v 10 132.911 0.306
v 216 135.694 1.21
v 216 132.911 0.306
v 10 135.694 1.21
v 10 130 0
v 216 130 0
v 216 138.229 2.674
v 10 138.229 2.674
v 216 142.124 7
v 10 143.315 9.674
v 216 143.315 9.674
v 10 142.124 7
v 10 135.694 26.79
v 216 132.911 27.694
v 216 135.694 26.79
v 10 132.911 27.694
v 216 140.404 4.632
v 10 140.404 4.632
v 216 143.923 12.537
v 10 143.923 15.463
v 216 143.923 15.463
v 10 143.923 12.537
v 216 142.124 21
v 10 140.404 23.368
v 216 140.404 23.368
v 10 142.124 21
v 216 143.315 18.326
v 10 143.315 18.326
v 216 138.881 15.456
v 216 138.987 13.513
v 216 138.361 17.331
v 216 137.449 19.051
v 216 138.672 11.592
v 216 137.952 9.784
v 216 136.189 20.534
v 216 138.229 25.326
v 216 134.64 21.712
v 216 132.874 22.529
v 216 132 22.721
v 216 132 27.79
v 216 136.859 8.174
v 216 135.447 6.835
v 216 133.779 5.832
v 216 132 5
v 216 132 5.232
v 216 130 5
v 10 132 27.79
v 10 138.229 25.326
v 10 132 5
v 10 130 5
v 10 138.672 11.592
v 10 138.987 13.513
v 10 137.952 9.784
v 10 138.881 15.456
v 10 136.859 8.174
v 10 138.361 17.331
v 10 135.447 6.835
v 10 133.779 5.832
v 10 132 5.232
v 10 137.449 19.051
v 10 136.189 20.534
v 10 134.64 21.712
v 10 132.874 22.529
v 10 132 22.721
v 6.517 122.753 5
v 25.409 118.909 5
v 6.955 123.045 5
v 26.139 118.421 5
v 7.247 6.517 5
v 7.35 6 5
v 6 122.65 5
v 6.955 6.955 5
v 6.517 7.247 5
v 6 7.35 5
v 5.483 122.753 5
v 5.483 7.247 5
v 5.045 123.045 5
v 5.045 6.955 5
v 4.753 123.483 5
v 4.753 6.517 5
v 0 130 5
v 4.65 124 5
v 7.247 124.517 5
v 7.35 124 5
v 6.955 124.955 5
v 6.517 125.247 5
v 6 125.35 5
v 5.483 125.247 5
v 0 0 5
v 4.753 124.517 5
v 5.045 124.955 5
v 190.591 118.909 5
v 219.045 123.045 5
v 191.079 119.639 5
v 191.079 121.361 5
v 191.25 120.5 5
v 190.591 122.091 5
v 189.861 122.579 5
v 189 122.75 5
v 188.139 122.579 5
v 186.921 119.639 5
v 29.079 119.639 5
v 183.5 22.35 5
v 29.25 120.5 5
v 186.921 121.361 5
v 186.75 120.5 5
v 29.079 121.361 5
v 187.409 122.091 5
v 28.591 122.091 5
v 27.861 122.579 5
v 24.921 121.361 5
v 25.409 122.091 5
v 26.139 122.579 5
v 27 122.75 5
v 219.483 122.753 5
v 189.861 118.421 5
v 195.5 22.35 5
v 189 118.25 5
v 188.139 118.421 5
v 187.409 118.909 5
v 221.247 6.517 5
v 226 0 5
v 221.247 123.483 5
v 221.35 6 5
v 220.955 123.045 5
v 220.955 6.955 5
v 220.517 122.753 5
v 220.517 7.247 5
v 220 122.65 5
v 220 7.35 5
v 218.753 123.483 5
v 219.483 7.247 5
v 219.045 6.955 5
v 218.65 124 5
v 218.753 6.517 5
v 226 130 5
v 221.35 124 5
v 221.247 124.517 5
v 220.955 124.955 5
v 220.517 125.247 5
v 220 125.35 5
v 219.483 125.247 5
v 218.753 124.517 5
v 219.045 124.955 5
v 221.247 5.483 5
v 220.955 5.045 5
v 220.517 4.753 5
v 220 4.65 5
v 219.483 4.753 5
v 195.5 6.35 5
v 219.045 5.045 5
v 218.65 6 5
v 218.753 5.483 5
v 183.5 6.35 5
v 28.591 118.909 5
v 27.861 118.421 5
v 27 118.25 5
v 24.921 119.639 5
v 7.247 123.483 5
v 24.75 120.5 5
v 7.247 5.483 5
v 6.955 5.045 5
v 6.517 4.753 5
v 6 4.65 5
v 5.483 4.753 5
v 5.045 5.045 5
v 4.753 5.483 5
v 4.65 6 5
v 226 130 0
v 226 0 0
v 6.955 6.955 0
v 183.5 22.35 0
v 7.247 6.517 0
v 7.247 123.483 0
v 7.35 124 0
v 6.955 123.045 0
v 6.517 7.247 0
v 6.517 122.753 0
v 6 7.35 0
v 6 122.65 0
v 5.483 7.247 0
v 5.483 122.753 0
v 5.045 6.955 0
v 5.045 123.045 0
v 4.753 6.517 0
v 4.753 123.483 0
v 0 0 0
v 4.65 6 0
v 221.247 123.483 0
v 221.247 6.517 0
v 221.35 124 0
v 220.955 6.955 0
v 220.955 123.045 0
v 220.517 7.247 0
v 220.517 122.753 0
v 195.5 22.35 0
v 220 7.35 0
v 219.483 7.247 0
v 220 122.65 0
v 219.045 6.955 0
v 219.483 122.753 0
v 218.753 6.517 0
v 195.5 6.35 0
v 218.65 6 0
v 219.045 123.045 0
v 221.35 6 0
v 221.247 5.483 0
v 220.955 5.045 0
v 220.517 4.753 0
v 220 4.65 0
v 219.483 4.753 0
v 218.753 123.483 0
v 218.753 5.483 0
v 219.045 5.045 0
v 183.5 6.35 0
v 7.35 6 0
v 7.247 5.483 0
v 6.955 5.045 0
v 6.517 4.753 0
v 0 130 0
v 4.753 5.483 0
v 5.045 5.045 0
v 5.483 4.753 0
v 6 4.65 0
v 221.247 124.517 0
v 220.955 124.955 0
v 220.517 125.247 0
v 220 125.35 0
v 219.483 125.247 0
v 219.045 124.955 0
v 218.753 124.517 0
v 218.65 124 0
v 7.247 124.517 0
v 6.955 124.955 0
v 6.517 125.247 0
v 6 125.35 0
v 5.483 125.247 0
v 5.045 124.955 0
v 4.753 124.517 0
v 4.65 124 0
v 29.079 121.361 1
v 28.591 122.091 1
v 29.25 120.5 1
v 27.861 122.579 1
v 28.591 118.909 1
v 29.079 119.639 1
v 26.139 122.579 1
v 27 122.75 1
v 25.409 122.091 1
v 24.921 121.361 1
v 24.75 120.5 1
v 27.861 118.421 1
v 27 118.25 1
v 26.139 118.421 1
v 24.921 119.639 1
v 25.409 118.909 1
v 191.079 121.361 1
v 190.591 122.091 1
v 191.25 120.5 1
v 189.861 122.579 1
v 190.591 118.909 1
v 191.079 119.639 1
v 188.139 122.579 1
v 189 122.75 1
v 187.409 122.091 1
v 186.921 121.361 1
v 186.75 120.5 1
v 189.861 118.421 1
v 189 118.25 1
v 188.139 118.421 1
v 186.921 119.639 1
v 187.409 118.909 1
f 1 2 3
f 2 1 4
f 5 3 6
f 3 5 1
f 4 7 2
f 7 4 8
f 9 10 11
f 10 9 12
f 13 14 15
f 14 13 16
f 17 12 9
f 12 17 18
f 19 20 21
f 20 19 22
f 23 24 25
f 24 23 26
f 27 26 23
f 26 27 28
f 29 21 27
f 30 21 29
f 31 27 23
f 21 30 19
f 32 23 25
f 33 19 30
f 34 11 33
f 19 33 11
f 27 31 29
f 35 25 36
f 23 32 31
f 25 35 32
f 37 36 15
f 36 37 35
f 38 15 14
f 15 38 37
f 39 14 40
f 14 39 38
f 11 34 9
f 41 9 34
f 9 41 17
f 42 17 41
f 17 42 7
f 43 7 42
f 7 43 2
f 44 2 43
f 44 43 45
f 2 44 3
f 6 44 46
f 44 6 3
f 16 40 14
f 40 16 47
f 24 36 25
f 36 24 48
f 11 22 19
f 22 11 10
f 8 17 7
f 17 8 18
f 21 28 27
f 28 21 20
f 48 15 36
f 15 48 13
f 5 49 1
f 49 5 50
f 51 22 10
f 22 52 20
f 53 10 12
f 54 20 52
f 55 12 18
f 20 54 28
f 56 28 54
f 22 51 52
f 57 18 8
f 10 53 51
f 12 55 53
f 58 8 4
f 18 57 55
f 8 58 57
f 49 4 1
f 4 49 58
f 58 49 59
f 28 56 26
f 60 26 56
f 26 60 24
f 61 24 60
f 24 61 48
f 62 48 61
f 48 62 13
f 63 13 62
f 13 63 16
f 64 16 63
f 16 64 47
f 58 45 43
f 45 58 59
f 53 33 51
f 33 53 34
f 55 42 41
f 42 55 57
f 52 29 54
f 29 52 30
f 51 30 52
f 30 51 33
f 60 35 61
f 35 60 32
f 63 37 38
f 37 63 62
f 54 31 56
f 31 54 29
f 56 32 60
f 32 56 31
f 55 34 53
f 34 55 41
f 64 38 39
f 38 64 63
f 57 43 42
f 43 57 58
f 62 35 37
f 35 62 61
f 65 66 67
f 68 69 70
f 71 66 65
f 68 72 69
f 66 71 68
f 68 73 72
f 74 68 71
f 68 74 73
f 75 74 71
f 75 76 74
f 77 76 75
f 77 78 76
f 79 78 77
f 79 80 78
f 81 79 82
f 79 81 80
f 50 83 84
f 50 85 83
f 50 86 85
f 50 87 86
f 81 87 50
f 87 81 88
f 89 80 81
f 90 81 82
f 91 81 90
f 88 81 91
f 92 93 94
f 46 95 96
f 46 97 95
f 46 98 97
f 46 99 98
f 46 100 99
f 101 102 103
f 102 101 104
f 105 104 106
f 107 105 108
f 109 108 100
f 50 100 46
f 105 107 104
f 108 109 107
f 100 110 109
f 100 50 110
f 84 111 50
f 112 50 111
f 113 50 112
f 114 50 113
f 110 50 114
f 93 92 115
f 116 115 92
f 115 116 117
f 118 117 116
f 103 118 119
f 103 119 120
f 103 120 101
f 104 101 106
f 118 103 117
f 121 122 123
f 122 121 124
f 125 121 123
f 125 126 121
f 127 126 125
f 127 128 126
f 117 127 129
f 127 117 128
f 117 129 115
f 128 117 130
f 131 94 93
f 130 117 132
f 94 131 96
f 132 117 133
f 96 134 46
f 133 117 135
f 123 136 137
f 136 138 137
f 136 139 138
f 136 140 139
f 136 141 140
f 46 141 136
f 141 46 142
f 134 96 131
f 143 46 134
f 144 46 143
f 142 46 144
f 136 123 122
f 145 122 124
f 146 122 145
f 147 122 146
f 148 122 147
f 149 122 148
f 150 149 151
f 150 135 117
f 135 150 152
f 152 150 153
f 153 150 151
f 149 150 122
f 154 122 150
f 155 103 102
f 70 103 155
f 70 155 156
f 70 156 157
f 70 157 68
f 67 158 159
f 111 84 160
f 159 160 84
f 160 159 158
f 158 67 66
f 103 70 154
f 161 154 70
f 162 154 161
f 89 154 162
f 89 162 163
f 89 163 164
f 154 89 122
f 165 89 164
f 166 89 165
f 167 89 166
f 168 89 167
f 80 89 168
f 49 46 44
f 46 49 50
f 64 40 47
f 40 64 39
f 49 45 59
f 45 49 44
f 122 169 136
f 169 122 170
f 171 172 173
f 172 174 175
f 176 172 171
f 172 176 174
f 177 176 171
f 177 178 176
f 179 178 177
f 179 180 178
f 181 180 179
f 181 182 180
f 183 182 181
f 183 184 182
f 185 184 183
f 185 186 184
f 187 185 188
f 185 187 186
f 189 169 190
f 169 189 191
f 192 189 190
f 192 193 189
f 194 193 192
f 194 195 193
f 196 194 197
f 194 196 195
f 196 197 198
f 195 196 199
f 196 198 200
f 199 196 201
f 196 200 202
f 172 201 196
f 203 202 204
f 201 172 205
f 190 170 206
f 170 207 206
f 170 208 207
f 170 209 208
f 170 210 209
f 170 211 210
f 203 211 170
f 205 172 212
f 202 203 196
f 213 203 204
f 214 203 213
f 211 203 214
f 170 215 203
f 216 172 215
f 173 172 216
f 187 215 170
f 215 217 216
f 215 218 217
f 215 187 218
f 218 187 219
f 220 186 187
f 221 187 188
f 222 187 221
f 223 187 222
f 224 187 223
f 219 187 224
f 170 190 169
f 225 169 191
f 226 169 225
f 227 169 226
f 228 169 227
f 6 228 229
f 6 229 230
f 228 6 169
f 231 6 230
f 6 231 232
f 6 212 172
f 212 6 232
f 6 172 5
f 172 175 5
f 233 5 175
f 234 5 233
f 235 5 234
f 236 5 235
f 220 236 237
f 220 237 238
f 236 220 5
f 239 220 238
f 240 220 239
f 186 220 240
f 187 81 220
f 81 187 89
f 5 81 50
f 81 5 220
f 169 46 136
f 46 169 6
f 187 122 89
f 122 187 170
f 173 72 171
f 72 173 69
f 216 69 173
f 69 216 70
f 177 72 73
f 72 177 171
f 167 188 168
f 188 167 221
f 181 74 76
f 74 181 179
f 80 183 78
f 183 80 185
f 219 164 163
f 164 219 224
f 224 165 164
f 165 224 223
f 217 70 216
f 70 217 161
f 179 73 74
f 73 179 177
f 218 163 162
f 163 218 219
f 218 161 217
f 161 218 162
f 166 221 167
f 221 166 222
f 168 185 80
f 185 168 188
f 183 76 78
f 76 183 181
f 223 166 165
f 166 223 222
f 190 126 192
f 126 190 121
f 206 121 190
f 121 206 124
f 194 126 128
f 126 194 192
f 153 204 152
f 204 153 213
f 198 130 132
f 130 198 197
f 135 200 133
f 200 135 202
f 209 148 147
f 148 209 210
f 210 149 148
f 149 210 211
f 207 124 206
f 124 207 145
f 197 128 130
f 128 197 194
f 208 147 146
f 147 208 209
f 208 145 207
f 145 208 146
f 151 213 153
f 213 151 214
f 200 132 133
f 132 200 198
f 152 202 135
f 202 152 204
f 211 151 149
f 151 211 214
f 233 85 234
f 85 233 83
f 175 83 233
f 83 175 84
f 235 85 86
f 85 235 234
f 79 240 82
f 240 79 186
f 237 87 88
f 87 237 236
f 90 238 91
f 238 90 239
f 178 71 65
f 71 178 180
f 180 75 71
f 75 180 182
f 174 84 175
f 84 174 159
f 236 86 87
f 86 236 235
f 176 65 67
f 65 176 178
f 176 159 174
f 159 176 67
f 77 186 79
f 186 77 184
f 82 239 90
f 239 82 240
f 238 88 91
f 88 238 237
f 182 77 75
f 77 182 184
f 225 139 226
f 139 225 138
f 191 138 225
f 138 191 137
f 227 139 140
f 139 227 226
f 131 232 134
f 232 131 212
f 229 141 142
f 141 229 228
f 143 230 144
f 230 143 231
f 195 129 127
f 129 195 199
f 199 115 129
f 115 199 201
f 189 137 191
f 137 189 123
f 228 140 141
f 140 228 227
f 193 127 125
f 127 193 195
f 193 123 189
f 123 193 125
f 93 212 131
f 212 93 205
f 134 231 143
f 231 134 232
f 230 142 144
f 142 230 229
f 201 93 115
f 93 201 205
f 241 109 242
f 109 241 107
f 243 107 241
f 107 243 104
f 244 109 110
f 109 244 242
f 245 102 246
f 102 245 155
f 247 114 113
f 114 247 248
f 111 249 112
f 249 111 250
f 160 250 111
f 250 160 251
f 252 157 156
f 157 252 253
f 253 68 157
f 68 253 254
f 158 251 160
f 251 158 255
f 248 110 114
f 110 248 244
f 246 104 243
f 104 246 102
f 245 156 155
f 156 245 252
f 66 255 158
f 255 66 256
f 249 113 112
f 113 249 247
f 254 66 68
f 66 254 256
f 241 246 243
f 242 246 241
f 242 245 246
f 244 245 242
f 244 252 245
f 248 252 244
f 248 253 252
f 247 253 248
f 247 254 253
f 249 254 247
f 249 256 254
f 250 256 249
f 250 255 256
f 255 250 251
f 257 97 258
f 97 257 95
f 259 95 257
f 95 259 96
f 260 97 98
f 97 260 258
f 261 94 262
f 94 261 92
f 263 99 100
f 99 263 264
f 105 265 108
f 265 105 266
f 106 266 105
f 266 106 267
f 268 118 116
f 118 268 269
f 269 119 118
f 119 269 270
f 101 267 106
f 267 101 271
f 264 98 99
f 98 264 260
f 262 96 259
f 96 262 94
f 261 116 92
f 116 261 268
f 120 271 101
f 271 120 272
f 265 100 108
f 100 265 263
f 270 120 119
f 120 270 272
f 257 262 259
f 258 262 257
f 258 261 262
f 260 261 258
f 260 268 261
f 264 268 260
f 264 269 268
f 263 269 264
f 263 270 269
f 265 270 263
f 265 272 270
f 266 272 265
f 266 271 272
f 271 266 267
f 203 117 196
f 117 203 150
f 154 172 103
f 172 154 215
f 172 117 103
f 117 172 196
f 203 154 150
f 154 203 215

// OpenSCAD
// file: params.scad
// Piputer — shared parametric constants
//
// Include (not use) this file in every .scad that needs these values:
//   include <./params.scad>
//
// OpenSCAD scoping: module parameter defaults override these globals
// inside the module body, which is the desired behaviour for optional overrides.

// ── Enclosure envelope ───────────────────────────────────────────────────────
W        = 226;     // enclosure width (X)
D        = 220;     // enclosure total depth (Y)
D_front  = 130;     // keyboard zone depth
D_clearance=15;      // space between electronicszone and lid
D_rear   = D - D_front;  // = 70, electronics zone depth
H_front  = 20;      // front zone height (Z)
H_rear   = 35;      // rear zone height (Z)
wall     = 2;       // shell wall thickness
floor_t  = 3;       // floor thickness

// ── Keyboard cover ───────────────────────────────────────────────────────────
kb_t     = 3;       // keyboard cover plate thickness

// ── Display lid ──────────────────────────────────────────────────────────────
back_t   = 5;       // display back plate thickness (top_cover)
bezel_t  = 3;       // display bezel thickness
lid_H    = 15;      // display lid total height

// ── Hinge geometry ───────────────────────────────────────────────────────────
thickness        = 1.5;     // arm/plate thickness (spring strip, 1.5mm min for FDM)
width            = 7.4;     // arm/barrel width
interleave_gap   = 4;       // gap between pin halves
bend_angle       = 70;      // spring-strip bend angle (degrees)
hinge_rise       = 7;       // barrel height above mount plate
barrel_z         = H_front + kb_t + hinge_rise;  // = 30

// Base-side mount plate length
plate_len        = 29.6;

// Lid-side mount plate length
lid_plate_len    = 22;

// Base-side arm length (derived: barrel sits exactly hinge_rise above mount plate)
arm_len = (hinge_rise + cos(bend_angle) * width/2) / sin(bend_angle);

// Barrel-axis offsets from bottom_mount() placement origin
barrel_y_off = sin(bend_angle) * width/2 + cos(bend_angle) * arm_len;
barrel_z_off = sin(bend_angle) * arm_len - cos(bend_angle) * width/2;

// Barrel Z in top.scad local coords (inside lid interior)
bz_local = 8;

// Hinge X positions (world coords, left inner edge)
hinge_left_x  = W-10;
hinge_right_x = 10;

// ── Hinge pin geometry ───────────────────────────────────────────────────────
pin_d_large  = width;
pin_d_small  = width / 2;
pin_h_full   = 4 * thickness;
pin_h_half   = interleave_gap / 2;

// ── Hinge screw holes ────────────────────────────────────────────────────────
hole_d         = 2.5;     // hole diameter
hole_margin    = 3;       // margin: edge to first/last hole
hole_pitch     = 4;       // hole spacing
holes_base     = 5;       // holes in base mount plate
holes_lid      = 4;       // holes in lid mount plate

// ── PCB placement (outer coords) ───────────────────────────────────────────
rpi_ox  = 139;    rpi_oy = 152;    // RPi5 / NVMe Base: board left/front corner
usv_ox  = 6;      usv_oy = 152;    // Waveshare UPS 3S
kb_ox   = 3;      kb_oy  = 2;      // MC-8017 keyboard

// PCB Z positions
pcb_z_nvme = floor_t + 7;           // = 10  (floor + standoff height)
pcb_z_rpi  = pcb_z_nvme + 1.6 + 7;  // = 18.6 (NVMe PCB + spacer)

// ── Hardware: heat-set inserts ───────────────────────────────────────────────
ins_d_m25     = 3.5;    // M2.5 heat-insert bore diameter
ins_depth_m25 = 5;      // M2.5 insert depth
clr_d_m25     = 2.7;    // M2.5 clearance hole diameter
ins_d_m3      = 4.5;    // M3 heat-insert bore (display PCB lash screws only)
ins_depth_m3  = 4;      // M3 insert depth

// ── Standoffs ────────────────────────────────────────────────────────────────
standoff_h = 7;      // standoff height
standoff_d = 8;      // standoff outer diameter

// ── PCB mount hole spacings ──────────────────────────────────────────────────
pi_hole_dx  = 58;    pi_hole_dy  = 49;    // RPi5 / NVMe Base (HAT pattern)
usv_hole_dx = 87;    usv_hole_dy = 54;    // Waveshare UPS 3S
kb_hole_dx  = 212;   kb_hole_dy  = 110;   // MC-8017 keyboard

// ── Manifold fix ─────────────────────────────────────────────────────────────
eps = 0.04;
// main file
// top_cover() — removable back plate for Piputer display lid
//
// Closes the open back face (Z=0) of top.scad.
// Print: outer face (Z=0) on bed.
//
// Z=0 : outer face (visible from back of open lid)
// Z=5 : inner face (presses against frame back opening)
//
// Hardware:
//   4 x M2.5x10 mm screws (back plate -> frame corner bosses)
//   2 x M3x 6 mm screws  (display PCB rear lash bores -> back-plate inserts)
//
// Display lash bore centres (lcd at (23,2) in top.scad coords):
//   Rear holes only: lash offset (4,118.5) and (166,118.5)
//   -> (27, 120.5)  (189, 120.5)
//   Front lash holes fall outside lid footprint with D=130 — omitted.
//
// HDMI relief: lcd() HDMI block at (160.5,4.35,-6.4) -> top.scad (183.5, 6.35)
//   Slot: 12x16 mm through-hole
//
// NOTE: M3 heat-inserts (ins_d=4.5) used here instead of M2.5 elsewhere,
//       because display PCB lash tabs have 3.5mm bores — M3 screw head seats on tab.

include <./params.scad>

module front_plate(W=W, D=D_front, back_t=back_t,
    ins_d=ins_d_m3, ins_depth=ins_depth_m3){
    cube([W,D, back_t]);
    
    translate([W/2,D,14])
    rotate([0,90,0]){
    difference(){
    cylinder(h=W-20,r=14,center=true);
    cylinder(h=W-18,r=9,center=true);
    translate([-21,-18,-120])
    cube([30,20,230]);
    }
    
    }
}

module top_cover(
    W=W, D=D_front+D_clearance, back_t=back_t,
    ins_d=ins_d_m3, ins_depth=ins_depth_m3
) {
    barrel_clr_d = width + 1.6;    // barrel clearance: dia 9 > width 7.4
    difference() {

        front_plate();

        // 4 x M2.5 clearance holes (dia 2.7 mm) — back plate -> frame corner bosses
        for (pos = [[6,6],[220,6],[6,124],[220,124]])
            translate([pos[0], pos[1], -eps])
                cylinder(h=back_t + 2*eps, d=clr_d_m25, $fn=16);

        // 2 x M3 heat-insert holes — rear display PCB lash bores
        for (pos = [[27, 120.5],[189, 120.5]])
            translate([pos[0], pos[1], back_t - ins_depth])
                cylinder(h=ins_depth + eps, d=ins_d, $fn=16);

        // HDMI cable-exit slot (12x16 mm, lcd HDMI block at Y=6.35)
        translate([183.5, 6.35, -eps])
            cube([12, 16, back_t + 2*eps]);

        // ── Barrel clearance notches at back edge ───────────────────────
        // Semicircular notches at Y=D_front for each hinge barrel.
     //   translate([hinge_left_x, D, -eps])
       //     cylinder(h = back_t + 2*eps, d = barrel_clr_d, $fn=24);
       // translate([hinge_right_x, D, -eps])
       //     cylinder(h = back_t + 2*eps, d = barrel_clr_d, $fn=24);
    }
}

top_cover();
